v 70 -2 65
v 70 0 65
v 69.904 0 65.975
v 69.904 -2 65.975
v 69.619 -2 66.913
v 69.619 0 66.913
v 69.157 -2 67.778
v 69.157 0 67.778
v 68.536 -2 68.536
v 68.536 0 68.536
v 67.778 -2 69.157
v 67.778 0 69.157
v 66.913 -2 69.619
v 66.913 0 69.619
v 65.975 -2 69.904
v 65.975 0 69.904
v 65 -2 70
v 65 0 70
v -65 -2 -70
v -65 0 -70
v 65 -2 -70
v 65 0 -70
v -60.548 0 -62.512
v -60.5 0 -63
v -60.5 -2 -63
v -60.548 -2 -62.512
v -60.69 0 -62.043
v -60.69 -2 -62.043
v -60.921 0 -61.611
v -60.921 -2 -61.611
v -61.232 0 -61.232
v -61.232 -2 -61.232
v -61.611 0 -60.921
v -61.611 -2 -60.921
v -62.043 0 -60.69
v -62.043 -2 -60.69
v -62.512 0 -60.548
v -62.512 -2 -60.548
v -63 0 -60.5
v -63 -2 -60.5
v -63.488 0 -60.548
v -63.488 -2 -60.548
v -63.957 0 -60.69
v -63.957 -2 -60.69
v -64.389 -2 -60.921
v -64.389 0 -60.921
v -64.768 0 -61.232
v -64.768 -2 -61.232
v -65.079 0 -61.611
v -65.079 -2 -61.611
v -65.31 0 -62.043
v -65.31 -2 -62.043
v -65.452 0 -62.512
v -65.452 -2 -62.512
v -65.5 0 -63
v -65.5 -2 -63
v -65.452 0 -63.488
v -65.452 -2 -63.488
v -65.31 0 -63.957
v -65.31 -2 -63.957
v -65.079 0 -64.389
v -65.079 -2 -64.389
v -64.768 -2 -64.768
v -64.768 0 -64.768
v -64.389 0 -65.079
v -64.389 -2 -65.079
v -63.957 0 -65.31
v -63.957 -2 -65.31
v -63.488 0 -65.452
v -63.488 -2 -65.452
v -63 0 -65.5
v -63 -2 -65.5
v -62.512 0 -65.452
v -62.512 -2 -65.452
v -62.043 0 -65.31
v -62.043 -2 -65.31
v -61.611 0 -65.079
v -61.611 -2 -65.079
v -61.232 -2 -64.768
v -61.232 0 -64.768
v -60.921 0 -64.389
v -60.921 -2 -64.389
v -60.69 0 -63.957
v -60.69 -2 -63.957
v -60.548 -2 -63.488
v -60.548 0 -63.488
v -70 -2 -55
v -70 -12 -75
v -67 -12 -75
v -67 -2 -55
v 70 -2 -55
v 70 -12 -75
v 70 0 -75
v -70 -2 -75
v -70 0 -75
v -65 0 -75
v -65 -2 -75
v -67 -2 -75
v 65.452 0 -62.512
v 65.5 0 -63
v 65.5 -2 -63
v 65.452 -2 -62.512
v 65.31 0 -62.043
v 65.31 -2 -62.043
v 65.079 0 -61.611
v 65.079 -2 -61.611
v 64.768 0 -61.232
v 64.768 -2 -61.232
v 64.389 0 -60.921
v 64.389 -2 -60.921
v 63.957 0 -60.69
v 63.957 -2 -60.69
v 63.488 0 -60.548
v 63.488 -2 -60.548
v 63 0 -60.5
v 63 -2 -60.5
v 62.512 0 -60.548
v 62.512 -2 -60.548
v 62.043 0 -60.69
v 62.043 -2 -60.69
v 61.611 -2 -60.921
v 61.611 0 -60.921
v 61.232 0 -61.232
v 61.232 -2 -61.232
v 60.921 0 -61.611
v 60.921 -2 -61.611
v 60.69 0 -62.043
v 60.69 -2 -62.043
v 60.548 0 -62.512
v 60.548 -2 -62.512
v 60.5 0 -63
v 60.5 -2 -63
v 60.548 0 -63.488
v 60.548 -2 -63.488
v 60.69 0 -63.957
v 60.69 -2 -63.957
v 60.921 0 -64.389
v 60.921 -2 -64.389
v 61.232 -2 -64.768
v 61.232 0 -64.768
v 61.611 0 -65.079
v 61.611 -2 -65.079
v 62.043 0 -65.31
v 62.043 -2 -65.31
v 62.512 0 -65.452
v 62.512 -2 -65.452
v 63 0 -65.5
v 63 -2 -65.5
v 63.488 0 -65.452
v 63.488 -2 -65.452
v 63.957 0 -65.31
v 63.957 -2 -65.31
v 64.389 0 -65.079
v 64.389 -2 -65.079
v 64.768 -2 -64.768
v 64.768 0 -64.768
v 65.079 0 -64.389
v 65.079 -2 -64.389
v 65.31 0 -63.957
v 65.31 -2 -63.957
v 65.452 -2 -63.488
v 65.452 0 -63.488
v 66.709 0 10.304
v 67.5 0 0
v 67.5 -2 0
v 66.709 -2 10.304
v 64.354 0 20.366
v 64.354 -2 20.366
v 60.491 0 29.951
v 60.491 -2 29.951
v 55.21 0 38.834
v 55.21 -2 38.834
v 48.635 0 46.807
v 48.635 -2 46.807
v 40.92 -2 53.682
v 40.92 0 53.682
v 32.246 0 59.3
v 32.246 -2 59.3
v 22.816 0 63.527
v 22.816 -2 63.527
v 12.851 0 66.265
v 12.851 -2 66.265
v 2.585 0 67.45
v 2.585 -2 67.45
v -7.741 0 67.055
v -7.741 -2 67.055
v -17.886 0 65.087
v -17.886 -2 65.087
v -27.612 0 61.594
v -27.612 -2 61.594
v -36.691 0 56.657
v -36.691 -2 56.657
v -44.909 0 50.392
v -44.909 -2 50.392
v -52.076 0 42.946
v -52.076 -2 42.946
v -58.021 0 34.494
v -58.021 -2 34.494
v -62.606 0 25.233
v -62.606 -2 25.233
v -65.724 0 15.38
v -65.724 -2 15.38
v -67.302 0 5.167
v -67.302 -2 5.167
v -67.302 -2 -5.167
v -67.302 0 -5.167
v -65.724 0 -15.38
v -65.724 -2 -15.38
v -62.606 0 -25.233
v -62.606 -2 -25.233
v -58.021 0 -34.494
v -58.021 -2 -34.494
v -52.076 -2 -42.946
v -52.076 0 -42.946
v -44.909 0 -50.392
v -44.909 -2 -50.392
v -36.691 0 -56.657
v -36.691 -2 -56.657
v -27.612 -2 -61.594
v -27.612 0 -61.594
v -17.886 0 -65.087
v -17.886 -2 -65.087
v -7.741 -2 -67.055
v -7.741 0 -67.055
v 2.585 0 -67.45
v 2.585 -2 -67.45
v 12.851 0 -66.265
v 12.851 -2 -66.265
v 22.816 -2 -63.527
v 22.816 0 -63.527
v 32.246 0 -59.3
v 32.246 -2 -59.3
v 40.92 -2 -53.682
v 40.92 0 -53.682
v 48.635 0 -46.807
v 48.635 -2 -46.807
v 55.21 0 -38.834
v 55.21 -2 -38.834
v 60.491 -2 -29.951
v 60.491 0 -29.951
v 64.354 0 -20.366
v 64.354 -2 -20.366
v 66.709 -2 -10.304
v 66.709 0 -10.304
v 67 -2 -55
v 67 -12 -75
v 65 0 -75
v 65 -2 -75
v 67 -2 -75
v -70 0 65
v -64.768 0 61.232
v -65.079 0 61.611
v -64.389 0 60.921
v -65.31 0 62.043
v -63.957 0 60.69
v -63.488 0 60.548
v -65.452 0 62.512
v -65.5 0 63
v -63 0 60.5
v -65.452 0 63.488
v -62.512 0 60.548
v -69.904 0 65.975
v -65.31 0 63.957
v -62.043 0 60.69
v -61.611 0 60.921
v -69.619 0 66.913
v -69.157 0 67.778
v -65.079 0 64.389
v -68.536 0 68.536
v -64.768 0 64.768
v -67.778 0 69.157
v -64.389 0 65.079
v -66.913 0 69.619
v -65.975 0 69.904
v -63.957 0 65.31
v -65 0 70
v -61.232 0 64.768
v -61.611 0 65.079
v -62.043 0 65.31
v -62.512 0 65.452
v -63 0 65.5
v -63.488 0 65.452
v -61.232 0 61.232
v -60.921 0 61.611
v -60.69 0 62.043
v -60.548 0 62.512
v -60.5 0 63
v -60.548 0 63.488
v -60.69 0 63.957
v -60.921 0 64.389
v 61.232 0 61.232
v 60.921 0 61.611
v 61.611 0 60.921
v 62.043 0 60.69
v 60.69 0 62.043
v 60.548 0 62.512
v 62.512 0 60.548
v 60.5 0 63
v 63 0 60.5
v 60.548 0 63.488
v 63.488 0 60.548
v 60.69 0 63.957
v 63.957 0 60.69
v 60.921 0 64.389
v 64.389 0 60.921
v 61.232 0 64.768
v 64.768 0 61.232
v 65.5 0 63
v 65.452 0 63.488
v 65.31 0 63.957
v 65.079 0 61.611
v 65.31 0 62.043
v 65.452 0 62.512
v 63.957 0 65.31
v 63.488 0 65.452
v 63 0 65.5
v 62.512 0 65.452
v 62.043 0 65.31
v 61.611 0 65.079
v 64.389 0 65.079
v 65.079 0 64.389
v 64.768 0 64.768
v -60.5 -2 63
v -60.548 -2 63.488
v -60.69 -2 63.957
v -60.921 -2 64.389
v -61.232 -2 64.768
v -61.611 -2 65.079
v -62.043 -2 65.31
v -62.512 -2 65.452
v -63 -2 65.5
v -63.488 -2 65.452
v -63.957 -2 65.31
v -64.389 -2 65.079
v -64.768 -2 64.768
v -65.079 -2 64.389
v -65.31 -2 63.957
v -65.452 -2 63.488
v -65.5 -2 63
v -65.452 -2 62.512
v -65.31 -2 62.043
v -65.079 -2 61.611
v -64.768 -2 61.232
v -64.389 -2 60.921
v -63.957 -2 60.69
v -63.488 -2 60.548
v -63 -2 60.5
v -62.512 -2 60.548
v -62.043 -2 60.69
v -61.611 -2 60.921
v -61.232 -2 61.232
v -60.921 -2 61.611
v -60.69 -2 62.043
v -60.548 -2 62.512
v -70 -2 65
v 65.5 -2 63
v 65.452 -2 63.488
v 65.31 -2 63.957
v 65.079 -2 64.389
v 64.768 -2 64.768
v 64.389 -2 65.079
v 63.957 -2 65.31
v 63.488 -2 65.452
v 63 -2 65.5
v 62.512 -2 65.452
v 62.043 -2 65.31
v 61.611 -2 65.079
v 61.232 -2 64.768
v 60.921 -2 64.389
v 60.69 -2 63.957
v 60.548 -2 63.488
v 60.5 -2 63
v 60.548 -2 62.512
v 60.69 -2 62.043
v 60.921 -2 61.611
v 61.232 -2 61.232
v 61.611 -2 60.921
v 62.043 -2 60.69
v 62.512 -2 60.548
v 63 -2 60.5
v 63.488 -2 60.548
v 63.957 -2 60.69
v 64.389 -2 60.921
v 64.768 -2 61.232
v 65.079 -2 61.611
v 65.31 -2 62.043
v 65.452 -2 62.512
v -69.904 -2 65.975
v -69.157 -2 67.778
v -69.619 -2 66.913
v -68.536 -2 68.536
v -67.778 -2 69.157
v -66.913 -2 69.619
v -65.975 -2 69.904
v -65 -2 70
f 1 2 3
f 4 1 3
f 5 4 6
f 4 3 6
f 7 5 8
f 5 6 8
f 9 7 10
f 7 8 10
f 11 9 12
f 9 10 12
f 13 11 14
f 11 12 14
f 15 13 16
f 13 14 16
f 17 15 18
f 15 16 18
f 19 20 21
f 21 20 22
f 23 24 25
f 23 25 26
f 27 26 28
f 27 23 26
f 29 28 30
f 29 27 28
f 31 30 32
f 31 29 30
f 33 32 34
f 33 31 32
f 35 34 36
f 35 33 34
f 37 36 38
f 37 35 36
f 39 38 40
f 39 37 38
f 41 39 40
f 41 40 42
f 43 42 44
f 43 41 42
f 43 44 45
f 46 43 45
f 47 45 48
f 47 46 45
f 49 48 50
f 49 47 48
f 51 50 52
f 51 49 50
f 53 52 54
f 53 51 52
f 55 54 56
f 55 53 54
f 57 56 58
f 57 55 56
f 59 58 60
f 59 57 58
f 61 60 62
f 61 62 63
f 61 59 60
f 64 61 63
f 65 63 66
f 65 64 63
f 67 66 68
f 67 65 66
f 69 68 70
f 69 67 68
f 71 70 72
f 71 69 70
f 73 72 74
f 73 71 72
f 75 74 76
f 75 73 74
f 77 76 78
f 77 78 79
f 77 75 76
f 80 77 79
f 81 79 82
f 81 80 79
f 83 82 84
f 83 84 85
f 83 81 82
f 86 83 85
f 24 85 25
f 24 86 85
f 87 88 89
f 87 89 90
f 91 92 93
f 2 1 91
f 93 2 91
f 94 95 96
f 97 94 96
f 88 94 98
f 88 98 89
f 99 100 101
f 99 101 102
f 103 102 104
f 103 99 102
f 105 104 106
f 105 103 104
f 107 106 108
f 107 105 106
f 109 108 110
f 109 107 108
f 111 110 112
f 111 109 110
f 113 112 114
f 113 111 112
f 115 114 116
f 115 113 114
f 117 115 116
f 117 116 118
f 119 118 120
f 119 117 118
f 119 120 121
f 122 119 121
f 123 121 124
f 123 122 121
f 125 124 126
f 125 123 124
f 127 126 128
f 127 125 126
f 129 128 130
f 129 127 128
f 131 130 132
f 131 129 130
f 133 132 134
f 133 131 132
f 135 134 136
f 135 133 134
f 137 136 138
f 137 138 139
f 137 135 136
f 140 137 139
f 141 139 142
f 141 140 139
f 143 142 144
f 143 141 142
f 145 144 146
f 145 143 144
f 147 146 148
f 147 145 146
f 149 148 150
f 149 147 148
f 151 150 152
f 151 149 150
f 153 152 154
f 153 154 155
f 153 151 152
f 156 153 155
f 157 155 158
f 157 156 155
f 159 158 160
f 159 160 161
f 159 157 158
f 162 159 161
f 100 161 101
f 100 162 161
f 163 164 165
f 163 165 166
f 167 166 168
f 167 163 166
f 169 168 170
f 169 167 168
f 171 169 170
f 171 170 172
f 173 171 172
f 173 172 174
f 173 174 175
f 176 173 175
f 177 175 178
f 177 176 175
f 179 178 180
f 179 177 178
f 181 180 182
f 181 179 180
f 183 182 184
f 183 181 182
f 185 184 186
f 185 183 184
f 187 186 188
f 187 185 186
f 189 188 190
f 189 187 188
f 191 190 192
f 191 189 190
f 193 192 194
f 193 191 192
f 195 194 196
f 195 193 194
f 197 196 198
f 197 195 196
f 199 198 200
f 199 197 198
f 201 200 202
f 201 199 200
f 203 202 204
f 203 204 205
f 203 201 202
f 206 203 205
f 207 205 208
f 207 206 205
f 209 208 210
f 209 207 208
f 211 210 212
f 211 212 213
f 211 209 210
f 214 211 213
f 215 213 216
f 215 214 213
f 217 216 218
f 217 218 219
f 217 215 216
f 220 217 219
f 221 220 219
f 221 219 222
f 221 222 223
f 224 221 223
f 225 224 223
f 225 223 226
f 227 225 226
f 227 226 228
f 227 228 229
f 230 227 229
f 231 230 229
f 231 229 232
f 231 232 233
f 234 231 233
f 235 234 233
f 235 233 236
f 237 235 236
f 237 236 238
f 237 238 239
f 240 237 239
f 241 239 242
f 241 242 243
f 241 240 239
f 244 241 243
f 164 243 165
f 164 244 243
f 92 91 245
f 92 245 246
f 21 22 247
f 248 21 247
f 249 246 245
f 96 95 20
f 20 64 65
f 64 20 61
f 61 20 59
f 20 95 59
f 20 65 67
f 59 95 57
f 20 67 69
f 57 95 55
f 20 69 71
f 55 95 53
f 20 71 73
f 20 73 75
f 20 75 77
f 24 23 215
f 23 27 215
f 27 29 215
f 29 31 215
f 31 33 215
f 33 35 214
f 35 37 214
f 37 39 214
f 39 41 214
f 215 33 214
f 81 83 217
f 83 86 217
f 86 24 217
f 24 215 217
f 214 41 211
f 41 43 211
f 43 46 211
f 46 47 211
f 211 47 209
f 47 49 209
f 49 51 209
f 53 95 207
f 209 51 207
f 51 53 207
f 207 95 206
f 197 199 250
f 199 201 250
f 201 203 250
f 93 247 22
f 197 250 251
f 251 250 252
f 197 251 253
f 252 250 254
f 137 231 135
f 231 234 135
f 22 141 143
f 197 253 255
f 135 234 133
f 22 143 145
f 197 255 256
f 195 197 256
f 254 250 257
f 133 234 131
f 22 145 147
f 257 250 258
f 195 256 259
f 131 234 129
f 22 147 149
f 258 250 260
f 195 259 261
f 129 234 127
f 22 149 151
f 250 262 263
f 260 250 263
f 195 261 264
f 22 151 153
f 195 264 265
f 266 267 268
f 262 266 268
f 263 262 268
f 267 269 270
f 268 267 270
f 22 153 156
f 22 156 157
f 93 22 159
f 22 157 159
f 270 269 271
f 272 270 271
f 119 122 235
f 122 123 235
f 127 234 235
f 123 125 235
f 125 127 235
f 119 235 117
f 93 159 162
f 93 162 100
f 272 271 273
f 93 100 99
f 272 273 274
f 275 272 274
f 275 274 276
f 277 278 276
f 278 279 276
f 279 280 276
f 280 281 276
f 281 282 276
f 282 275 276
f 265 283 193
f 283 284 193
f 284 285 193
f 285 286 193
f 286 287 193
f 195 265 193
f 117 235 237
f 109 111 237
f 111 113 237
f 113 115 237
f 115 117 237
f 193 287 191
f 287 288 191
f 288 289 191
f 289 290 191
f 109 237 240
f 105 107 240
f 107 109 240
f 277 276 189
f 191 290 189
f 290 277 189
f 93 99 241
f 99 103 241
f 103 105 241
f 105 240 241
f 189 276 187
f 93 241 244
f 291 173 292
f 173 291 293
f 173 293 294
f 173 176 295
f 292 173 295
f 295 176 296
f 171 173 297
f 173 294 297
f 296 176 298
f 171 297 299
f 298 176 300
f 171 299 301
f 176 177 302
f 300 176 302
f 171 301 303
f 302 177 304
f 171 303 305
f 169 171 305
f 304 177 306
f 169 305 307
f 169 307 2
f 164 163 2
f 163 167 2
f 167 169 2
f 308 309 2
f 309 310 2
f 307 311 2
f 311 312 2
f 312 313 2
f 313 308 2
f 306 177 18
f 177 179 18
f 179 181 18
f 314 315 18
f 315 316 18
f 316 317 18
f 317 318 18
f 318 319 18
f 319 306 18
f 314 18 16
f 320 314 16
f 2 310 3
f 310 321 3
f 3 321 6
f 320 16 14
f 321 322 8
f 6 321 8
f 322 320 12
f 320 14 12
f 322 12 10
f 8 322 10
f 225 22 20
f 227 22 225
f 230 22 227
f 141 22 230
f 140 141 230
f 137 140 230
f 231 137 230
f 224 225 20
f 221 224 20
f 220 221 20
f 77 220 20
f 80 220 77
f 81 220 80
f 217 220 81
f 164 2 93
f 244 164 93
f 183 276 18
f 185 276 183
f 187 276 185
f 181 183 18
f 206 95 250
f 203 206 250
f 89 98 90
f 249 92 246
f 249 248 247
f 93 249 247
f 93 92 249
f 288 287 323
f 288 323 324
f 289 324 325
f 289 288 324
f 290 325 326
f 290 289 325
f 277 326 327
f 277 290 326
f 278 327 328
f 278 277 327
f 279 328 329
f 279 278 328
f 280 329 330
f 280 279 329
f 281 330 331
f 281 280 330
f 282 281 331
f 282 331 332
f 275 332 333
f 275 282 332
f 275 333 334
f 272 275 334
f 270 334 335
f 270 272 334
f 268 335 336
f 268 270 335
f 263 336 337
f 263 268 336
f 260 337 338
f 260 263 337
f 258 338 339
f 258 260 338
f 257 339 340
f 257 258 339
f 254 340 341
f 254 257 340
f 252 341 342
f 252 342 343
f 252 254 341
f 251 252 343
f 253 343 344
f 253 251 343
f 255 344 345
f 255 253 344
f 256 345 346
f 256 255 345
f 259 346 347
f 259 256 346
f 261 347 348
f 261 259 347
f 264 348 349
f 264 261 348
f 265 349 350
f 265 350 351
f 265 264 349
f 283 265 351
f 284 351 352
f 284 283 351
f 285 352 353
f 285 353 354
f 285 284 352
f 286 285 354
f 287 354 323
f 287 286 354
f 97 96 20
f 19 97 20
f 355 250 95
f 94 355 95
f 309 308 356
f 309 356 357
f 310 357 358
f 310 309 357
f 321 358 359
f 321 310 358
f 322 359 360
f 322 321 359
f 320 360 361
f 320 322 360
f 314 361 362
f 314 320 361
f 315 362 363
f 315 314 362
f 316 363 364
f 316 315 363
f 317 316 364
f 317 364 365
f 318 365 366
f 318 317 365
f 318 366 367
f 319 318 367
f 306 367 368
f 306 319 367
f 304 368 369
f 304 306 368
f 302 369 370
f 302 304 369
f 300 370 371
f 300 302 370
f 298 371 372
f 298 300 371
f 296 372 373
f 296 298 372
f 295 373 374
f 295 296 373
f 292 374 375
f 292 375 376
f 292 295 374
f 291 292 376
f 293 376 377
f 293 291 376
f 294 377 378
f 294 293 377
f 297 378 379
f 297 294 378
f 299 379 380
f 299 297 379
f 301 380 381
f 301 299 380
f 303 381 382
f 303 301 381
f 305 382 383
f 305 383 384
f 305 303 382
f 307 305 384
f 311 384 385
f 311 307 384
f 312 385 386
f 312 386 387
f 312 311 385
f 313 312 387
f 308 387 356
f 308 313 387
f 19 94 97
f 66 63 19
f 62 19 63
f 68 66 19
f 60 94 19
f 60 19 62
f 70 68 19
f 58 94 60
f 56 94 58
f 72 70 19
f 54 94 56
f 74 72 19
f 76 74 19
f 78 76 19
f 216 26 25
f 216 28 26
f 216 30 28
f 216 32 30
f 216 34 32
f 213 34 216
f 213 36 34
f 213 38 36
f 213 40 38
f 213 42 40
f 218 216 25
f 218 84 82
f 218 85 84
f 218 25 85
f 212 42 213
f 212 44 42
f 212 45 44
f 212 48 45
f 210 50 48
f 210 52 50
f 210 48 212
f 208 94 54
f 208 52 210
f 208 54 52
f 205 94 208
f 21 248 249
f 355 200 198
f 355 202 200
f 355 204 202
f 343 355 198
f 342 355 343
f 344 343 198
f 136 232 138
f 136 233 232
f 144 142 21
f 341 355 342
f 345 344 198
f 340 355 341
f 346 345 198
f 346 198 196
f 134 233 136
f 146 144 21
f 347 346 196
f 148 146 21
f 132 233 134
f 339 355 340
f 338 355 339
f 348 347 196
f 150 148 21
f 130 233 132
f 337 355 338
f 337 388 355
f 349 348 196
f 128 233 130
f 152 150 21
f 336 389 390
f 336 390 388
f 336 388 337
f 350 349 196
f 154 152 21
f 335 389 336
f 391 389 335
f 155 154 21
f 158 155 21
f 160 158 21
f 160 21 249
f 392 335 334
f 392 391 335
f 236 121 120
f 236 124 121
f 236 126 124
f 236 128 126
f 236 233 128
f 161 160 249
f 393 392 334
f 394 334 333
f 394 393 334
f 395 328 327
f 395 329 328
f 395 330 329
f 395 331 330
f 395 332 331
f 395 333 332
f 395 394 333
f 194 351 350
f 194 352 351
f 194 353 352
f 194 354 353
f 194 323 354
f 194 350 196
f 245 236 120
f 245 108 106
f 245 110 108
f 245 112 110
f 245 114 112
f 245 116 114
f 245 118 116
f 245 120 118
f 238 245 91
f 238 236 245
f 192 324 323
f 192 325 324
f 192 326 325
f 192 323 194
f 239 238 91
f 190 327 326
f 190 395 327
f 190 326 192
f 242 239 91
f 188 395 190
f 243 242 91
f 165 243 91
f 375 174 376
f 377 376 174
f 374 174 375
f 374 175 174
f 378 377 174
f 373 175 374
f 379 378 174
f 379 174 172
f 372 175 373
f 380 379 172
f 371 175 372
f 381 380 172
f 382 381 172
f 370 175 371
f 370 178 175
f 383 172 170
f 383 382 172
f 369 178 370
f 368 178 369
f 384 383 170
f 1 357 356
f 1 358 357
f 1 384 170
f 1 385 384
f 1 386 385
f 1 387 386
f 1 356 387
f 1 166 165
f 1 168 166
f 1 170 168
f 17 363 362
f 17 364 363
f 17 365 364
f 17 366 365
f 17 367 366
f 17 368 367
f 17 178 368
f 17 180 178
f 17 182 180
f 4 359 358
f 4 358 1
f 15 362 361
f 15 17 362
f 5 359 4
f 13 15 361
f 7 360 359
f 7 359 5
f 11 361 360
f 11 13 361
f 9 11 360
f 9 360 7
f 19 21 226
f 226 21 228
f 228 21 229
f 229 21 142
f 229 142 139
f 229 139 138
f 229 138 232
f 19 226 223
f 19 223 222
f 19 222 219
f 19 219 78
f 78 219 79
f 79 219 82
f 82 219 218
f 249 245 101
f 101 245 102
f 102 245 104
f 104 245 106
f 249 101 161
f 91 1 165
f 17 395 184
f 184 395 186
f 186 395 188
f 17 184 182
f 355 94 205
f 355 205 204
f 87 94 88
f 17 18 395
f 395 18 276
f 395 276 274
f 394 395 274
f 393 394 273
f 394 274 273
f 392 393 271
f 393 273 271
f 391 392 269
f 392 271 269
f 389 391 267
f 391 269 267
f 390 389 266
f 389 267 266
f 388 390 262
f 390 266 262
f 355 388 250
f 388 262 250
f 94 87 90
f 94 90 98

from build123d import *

# Parameters (mm, degrees)
F0_R     = 2.5
F0_R_2   = 67.5
F1_DEPTH = 2
F3_DEPTH = 3
F5_DEPTH = 3


with BuildPart() as f1:
    # F0 (on Front) → F1 (new body)
    with BuildSketch(Plane.XZ):
        with BuildLine():
            Line((-65, -75), (-65, -70))
            Line((-65, -70), (65, -70))
            Line((65, -70), (65, -75))
            Line((65, -75), (70, -75))
            Line((70, -75), (70, 65))
            ThreePointArc((70, 65), (68.535534, 68.535534), (65, 70))
            Line((65, 70), (-65, 70))
            ThreePointArc((-65, 70), (-68.535534, 68.535534), (-70, 65))
            Line((-70, 65), (-70, -75))
            Line((-70, -75), (-65, -75))
        make_face()
        with Locations((-63, -63)):
            Circle(F0_R, mode=Mode.SUBTRACT)
        with Locations((63, -63)):
            Circle(F0_R, mode=Mode.SUBTRACT)
        with Locations((-63, 63)):
            Circle(F0_R, mode=Mode.SUBTRACT)
        Circle(F0_R_2, mode=Mode.SUBTRACT)
        with Locations((63, 63)):
            Circle(F0_R, mode=Mode.SUBTRACT)
    extrude(amount=F1_DEPTH)

    # F4 (on face) → F5 (join)
    with BuildSketch(Plane.YZ.offset(70)):
        Polygon((-12, -75), (-2, -75), (-2, -55), align=None)
    extrude(amount=-F5_DEPTH)


with BuildPart() as f3:
    # F2 (on face) → F3 (new body)
    with BuildSketch(Plane(origin=(-70, 0, 0), x_dir=(0, -1, 0), z_dir=(-1, 0, 0))):
        Polygon((2, -55), (2, -75), (12, -75), align=None)
    extrude(amount=-F3_DEPTH)


solid = Compound([f1.part, f3.part])
